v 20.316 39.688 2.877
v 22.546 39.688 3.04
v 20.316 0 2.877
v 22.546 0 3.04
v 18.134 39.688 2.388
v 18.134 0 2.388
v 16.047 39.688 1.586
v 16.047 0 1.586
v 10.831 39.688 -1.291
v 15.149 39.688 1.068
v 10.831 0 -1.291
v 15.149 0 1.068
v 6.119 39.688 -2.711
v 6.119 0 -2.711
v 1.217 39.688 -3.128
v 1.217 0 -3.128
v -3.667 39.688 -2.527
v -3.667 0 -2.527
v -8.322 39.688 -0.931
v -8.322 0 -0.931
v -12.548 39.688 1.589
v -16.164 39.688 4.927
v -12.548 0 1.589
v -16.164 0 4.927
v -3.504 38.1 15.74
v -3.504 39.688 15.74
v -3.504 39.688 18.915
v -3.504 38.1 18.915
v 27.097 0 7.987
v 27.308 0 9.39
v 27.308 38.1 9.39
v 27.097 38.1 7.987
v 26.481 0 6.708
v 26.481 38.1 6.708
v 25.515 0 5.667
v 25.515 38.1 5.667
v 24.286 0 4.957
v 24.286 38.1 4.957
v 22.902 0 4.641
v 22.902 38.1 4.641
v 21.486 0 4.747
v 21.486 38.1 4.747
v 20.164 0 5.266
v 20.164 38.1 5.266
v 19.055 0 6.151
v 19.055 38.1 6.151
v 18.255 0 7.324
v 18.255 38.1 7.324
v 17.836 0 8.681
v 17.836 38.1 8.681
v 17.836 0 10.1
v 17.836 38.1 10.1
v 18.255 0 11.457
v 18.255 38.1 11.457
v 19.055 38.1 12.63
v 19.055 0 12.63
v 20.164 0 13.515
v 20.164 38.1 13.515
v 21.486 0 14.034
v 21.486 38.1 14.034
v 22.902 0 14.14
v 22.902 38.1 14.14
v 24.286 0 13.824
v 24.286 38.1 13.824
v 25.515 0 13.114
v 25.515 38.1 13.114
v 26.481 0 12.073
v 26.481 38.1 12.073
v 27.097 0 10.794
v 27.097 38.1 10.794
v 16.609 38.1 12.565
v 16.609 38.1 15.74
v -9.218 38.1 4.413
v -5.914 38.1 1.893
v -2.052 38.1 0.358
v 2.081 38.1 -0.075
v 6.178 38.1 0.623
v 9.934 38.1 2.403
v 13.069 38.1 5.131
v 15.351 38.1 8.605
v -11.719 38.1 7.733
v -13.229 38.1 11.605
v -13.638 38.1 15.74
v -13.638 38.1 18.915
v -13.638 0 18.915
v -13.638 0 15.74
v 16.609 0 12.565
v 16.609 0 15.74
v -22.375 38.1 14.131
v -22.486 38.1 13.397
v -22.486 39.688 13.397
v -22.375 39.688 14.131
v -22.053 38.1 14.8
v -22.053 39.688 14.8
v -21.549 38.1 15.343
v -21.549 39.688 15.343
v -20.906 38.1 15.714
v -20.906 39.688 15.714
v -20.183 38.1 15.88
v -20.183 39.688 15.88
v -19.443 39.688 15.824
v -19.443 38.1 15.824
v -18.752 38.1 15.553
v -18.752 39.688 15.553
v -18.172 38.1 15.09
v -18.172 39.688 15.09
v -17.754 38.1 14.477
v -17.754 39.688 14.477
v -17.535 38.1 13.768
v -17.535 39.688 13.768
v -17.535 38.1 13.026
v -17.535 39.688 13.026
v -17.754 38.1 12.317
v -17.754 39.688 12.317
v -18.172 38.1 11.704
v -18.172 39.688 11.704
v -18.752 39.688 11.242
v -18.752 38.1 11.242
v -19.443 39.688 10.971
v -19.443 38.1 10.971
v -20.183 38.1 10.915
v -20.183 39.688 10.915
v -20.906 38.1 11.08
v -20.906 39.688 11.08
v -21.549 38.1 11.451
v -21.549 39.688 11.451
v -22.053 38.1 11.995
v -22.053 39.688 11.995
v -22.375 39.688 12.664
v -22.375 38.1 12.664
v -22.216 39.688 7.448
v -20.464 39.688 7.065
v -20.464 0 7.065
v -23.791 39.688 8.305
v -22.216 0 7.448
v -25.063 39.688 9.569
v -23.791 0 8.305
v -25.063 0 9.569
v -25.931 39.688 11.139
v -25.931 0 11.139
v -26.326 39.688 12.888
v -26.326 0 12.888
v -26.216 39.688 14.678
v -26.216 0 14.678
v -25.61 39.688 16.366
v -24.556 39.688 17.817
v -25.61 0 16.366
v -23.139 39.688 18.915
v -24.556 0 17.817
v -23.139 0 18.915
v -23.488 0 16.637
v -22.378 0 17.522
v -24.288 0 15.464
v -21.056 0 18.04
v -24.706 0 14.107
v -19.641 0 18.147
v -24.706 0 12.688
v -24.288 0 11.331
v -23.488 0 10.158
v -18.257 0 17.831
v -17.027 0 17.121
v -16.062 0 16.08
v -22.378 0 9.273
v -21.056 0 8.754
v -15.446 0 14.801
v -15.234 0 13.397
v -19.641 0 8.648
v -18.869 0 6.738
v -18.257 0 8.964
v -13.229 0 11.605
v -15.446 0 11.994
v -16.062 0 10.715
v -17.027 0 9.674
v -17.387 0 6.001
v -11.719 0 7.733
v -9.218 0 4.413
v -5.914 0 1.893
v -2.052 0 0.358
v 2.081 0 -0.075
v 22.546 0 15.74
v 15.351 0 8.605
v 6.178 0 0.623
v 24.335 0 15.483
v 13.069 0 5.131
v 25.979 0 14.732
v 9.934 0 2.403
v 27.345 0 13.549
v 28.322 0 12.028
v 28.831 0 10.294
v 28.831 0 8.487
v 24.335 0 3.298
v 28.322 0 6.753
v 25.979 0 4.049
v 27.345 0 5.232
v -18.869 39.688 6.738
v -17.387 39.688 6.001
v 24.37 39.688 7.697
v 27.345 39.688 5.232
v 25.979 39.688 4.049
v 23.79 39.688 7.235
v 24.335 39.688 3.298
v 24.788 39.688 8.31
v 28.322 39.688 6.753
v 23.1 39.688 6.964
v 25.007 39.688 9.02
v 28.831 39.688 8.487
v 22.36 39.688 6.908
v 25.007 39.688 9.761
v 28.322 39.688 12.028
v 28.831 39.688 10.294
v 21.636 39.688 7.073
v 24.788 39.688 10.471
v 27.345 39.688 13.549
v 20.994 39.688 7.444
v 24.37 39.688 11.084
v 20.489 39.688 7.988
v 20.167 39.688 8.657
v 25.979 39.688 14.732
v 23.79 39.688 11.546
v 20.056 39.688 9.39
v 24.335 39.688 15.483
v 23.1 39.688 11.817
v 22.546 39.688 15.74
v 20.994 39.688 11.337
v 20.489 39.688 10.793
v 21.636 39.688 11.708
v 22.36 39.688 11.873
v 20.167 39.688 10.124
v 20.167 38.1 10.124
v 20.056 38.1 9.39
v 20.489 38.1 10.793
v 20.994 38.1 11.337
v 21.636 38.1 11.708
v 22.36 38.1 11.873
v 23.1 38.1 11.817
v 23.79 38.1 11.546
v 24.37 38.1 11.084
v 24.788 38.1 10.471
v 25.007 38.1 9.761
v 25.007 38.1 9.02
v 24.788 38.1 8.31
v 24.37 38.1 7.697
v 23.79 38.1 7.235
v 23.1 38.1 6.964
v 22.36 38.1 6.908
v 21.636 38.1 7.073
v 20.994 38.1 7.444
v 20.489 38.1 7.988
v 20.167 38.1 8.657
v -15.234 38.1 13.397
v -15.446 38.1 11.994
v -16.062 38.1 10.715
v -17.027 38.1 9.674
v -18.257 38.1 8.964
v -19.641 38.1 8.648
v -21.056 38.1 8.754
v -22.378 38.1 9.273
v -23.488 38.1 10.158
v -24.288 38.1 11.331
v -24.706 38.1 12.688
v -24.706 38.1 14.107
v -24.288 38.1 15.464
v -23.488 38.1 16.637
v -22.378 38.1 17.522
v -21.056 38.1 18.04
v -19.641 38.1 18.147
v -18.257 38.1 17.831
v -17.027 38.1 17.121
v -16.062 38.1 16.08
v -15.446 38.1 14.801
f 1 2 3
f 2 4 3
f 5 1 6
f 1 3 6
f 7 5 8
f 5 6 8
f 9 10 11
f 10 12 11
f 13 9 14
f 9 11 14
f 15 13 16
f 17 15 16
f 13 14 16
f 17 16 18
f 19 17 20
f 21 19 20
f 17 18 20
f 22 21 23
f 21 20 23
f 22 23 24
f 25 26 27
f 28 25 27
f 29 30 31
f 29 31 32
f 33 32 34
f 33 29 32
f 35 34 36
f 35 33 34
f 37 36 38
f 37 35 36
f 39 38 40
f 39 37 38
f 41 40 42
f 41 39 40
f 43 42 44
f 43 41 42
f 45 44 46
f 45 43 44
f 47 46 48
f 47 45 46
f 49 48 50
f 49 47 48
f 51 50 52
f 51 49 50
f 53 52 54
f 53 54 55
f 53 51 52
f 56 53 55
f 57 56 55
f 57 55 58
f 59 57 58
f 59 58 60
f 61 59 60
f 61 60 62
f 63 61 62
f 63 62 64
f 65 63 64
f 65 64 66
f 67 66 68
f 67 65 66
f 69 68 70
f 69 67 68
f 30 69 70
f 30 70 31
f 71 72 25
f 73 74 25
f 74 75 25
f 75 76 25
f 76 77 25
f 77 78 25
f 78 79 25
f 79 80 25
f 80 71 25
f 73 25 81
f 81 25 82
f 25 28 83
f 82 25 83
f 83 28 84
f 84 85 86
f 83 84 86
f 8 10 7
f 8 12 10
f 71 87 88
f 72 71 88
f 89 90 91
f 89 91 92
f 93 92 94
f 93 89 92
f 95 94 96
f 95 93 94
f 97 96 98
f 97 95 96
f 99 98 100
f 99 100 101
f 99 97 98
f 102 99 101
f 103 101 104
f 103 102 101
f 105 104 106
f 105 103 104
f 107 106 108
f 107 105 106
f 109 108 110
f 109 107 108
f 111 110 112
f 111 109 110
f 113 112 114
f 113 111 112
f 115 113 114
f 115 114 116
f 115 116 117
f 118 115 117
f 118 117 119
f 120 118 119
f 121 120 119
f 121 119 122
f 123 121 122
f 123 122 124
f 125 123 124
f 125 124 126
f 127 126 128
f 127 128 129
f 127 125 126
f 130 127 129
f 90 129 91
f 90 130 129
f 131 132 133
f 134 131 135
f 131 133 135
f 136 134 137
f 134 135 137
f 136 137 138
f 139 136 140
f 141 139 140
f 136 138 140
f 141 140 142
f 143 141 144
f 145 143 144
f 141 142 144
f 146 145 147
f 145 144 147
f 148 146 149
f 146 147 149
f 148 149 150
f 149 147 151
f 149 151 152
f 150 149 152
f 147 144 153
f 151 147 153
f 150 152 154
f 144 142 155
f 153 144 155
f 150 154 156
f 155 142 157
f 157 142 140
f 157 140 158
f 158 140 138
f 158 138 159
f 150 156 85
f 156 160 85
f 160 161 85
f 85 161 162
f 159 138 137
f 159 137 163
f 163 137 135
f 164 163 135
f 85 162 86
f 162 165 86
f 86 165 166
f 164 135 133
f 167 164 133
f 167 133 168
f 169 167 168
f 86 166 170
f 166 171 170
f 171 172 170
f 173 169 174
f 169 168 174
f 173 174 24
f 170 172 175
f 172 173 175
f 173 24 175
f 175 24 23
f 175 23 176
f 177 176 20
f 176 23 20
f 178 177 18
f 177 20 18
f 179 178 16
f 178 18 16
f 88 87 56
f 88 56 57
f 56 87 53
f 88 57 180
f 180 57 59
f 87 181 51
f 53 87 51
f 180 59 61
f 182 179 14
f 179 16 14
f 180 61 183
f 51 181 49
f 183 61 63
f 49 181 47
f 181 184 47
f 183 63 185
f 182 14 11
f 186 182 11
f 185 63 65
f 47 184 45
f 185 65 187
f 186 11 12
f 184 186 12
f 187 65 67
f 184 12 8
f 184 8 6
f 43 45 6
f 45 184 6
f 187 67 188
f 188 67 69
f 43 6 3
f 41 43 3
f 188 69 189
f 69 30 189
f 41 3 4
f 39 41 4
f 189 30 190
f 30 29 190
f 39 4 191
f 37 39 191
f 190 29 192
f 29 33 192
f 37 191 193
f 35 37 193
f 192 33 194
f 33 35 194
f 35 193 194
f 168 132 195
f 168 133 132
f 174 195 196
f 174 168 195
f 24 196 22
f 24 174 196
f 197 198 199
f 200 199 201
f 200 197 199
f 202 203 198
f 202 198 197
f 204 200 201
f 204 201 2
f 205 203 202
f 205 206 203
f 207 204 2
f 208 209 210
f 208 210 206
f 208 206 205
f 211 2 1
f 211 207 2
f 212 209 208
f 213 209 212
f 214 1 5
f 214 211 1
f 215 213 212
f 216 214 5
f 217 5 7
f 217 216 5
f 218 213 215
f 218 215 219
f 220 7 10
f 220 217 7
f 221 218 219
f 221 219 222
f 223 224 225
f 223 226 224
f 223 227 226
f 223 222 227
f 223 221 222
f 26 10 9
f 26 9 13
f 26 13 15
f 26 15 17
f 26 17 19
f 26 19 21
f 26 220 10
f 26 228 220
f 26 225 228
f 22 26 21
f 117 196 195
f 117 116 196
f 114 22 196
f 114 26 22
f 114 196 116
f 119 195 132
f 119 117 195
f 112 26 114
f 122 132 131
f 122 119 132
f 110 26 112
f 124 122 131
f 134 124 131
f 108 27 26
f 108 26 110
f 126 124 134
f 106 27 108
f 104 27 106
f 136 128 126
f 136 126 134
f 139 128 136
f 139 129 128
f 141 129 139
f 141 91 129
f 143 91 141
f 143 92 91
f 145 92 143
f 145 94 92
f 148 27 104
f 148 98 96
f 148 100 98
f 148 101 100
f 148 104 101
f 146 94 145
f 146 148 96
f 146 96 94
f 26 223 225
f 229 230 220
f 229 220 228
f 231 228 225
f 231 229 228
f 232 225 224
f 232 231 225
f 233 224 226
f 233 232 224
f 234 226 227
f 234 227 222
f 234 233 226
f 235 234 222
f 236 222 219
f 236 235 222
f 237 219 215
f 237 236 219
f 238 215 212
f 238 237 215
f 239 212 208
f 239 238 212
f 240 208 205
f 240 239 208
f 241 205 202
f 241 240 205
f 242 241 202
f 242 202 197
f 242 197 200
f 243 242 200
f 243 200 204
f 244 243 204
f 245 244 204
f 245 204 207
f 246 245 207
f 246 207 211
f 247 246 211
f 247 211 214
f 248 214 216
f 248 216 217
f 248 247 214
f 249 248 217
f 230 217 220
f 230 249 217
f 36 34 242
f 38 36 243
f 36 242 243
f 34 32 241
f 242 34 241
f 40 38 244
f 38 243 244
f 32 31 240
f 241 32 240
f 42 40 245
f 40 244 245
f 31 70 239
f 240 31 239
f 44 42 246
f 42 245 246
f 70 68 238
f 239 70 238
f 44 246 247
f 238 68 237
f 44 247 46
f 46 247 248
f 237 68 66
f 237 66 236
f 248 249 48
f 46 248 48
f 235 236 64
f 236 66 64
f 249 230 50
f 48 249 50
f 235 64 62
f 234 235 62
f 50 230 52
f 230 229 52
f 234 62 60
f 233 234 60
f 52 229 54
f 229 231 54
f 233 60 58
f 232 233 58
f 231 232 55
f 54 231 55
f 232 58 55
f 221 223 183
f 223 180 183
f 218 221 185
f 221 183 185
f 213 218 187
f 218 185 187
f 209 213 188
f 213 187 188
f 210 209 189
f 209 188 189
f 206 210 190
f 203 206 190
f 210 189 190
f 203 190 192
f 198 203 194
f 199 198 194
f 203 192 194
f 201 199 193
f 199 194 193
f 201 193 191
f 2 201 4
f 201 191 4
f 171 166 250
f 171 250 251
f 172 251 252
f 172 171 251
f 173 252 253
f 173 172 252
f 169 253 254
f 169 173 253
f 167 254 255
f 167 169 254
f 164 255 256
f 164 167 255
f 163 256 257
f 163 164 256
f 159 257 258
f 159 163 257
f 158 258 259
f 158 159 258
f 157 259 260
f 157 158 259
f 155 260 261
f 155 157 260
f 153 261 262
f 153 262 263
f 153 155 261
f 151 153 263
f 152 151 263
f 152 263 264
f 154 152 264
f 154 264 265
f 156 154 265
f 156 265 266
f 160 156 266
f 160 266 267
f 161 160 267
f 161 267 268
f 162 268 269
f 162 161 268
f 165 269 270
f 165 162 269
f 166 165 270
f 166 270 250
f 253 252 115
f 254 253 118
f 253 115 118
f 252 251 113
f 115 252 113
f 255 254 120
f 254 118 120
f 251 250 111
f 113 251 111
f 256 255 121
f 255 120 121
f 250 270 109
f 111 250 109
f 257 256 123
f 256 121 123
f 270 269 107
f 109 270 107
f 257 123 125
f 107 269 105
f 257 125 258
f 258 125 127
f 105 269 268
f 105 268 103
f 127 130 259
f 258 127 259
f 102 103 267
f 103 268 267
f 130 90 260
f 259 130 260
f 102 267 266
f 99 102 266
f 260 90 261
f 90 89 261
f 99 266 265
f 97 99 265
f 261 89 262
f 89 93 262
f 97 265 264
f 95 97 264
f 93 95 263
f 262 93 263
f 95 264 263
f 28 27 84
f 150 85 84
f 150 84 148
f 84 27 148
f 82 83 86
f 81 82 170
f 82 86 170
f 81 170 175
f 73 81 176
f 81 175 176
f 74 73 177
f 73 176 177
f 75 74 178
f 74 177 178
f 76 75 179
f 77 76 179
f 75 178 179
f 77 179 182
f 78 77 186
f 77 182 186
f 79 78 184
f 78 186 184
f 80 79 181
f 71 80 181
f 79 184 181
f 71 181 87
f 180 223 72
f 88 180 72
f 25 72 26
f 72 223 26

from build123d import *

# Parameters (mm, degrees)
SKETCH2_R           = 4.7625
BOSS_EXTRUDE1_DEPTH = 38.1
SKETCH3_R           = 2.4892
BOSS_EXTRUDE2_DEPTH = 1.5875
SKETCH4_W           = 20.112893425
SKETCH4_H           = 3.175
SKETCH4_W_2         = 10.134015187
BOSS_EXTRUDE3_DEPTH = 1.5875
FILLET2_R           = 6.35


with BuildPart() as part:
    # Sketch2 → Boss-Extrude1 (new body)
    with BuildSketch(Plane(origin=(0, 0, 0), x_dir=(1, 0, 0), z_dir=(0, 1, 0))):
        with BuildLine():
            Line((-13.637822674, -18.9154966), (-13.637822674, -15.7404966))
            ThreePointArc((-13.637822674, -15.7404966), (0, 0), (16.609085938, -12.5654966))
            Line((16.609085938, -12.5654966), (16.609085938, -15.7404966))
            Line((16.609085938, -15.7404966), (22.545691393, -15.7404966))
            ThreePointArc((22.545691393, -15.7404966), (28.895691393, -9.3904966), (22.545691393, -3.0404966))
            ThreePointArc((22.545691393, -3.0404966), (18.914562129, -2.601594541), (15.492581173, -1.310168551))
            ThreePointArc((15.492581173, -1.310168551), (-2.207478742, 2.815047226), (-17.640279185, -6.783817119))
            ThreePointArc((-17.640279185, -6.783817119), (-18.810770101, -6.984553123), (-19.996688426, -7.047335697))
            ThreePointArc((-19.996688426, -7.047335697), (-26.135207048, -11.772192893), (-23.138726022, -18.9154966))
            Line((-23.138726022, -18.9154966), (-13.637822674, -18.9154966))
        make_face()
        with Locations((-19.996688426, -13.397335697)):
            Circle(SKETCH2_R, mode=Mode.SUBTRACT)
        with Locations((22.545691393, -9.3904966)):
            Circle(SKETCH2_R, mode=Mode.SUBTRACT)
    extrude(amount=BOSS_EXTRUDE1_DEPTH)

    # Sketch3 → Boss-Extrude2 (add)
    with BuildSketch(Plane(origin=(0, 38.1, 0), x_dir=(-1, 0, 0), z_dir=(0, 1, 0))):
        with BuildLine():
            Line((13.637822674, 15.7404966), (3.503807487, 15.7404966))
            Line((3.503807487, 15.7404966), (3.503807487, 12.5654966))
            Line((3.503807487, 12.5654966), (-16.609085938, 12.5654966))
            Line((-16.609085938, 12.5654966), (-16.609085938, 15.7404966))
            Line((-16.609085938, 15.7404966), (-22.545691393, 15.7404966))
            ThreePointArc((-22.545691393, 15.7404966), (-28.895691393, 9.3904966), (-22.545691393, 3.0404966))
            ThreePointArc((-22.545691393, 3.0404966), (-18.914562129, 2.601594541), (-15.492581173, 1.310168551))
            ThreePointArc((-15.492581173, 1.310168551), (2.207478742, -2.815047226), (17.640279185, 6.783817119))
            ThreePointArc((17.640279185, 6.783817119), (18.810770101, 6.984553123), (19.996688426, 7.047335697))
            ThreePointArc((19.996688426, 7.047335697), (26.135207048, 11.772192893), (23.138726022, 18.9154966))
            Line((23.138726022, 18.9154966), (13.637822674, 18.9154966))
            Line((13.637822674, 18.9154966), (13.637822674, 15.7404966))
        make_face()
        with Locations((-22.545691393, 9.3904966)):
            Circle(SKETCH3_R, mode=Mode.SUBTRACT)
        with Locations((19.996688426, 13.397335697)):
            Circle(SKETCH3_R, mode=Mode.SUBTRACT)
    extrude(amount=BOSS_EXTRUDE2_DEPTH)

    # Sketch4 → Boss-Extrude3 (add)
    with BuildSketch(Plane(origin=(0, 39.6875, 0), x_dir=(-1, 0, 0), z_dir=(0, 1, 0))):
        with Locations((-6.552639226, 14.1529966)):
            Rectangle(SKETCH4_W, SKETCH4_H)
        with Locations((8.570815081, 17.3279966)):
            Rectangle(SKETCH4_W_2, SKETCH4_H)
    extrude(amount=-BOSS_EXTRUDE3_DEPTH)

    # Fillet2
    fillet2_edges = [part.edges().sort_by_distance(p)[0] for p in [
        (15.492581173, 19.84375, 1.310168551),
        (-17.640279185, 19.84375, 6.783817119),
    ]]
    fillet(fillet2_edges, radius=FILLET2_R)


solid = part.part
